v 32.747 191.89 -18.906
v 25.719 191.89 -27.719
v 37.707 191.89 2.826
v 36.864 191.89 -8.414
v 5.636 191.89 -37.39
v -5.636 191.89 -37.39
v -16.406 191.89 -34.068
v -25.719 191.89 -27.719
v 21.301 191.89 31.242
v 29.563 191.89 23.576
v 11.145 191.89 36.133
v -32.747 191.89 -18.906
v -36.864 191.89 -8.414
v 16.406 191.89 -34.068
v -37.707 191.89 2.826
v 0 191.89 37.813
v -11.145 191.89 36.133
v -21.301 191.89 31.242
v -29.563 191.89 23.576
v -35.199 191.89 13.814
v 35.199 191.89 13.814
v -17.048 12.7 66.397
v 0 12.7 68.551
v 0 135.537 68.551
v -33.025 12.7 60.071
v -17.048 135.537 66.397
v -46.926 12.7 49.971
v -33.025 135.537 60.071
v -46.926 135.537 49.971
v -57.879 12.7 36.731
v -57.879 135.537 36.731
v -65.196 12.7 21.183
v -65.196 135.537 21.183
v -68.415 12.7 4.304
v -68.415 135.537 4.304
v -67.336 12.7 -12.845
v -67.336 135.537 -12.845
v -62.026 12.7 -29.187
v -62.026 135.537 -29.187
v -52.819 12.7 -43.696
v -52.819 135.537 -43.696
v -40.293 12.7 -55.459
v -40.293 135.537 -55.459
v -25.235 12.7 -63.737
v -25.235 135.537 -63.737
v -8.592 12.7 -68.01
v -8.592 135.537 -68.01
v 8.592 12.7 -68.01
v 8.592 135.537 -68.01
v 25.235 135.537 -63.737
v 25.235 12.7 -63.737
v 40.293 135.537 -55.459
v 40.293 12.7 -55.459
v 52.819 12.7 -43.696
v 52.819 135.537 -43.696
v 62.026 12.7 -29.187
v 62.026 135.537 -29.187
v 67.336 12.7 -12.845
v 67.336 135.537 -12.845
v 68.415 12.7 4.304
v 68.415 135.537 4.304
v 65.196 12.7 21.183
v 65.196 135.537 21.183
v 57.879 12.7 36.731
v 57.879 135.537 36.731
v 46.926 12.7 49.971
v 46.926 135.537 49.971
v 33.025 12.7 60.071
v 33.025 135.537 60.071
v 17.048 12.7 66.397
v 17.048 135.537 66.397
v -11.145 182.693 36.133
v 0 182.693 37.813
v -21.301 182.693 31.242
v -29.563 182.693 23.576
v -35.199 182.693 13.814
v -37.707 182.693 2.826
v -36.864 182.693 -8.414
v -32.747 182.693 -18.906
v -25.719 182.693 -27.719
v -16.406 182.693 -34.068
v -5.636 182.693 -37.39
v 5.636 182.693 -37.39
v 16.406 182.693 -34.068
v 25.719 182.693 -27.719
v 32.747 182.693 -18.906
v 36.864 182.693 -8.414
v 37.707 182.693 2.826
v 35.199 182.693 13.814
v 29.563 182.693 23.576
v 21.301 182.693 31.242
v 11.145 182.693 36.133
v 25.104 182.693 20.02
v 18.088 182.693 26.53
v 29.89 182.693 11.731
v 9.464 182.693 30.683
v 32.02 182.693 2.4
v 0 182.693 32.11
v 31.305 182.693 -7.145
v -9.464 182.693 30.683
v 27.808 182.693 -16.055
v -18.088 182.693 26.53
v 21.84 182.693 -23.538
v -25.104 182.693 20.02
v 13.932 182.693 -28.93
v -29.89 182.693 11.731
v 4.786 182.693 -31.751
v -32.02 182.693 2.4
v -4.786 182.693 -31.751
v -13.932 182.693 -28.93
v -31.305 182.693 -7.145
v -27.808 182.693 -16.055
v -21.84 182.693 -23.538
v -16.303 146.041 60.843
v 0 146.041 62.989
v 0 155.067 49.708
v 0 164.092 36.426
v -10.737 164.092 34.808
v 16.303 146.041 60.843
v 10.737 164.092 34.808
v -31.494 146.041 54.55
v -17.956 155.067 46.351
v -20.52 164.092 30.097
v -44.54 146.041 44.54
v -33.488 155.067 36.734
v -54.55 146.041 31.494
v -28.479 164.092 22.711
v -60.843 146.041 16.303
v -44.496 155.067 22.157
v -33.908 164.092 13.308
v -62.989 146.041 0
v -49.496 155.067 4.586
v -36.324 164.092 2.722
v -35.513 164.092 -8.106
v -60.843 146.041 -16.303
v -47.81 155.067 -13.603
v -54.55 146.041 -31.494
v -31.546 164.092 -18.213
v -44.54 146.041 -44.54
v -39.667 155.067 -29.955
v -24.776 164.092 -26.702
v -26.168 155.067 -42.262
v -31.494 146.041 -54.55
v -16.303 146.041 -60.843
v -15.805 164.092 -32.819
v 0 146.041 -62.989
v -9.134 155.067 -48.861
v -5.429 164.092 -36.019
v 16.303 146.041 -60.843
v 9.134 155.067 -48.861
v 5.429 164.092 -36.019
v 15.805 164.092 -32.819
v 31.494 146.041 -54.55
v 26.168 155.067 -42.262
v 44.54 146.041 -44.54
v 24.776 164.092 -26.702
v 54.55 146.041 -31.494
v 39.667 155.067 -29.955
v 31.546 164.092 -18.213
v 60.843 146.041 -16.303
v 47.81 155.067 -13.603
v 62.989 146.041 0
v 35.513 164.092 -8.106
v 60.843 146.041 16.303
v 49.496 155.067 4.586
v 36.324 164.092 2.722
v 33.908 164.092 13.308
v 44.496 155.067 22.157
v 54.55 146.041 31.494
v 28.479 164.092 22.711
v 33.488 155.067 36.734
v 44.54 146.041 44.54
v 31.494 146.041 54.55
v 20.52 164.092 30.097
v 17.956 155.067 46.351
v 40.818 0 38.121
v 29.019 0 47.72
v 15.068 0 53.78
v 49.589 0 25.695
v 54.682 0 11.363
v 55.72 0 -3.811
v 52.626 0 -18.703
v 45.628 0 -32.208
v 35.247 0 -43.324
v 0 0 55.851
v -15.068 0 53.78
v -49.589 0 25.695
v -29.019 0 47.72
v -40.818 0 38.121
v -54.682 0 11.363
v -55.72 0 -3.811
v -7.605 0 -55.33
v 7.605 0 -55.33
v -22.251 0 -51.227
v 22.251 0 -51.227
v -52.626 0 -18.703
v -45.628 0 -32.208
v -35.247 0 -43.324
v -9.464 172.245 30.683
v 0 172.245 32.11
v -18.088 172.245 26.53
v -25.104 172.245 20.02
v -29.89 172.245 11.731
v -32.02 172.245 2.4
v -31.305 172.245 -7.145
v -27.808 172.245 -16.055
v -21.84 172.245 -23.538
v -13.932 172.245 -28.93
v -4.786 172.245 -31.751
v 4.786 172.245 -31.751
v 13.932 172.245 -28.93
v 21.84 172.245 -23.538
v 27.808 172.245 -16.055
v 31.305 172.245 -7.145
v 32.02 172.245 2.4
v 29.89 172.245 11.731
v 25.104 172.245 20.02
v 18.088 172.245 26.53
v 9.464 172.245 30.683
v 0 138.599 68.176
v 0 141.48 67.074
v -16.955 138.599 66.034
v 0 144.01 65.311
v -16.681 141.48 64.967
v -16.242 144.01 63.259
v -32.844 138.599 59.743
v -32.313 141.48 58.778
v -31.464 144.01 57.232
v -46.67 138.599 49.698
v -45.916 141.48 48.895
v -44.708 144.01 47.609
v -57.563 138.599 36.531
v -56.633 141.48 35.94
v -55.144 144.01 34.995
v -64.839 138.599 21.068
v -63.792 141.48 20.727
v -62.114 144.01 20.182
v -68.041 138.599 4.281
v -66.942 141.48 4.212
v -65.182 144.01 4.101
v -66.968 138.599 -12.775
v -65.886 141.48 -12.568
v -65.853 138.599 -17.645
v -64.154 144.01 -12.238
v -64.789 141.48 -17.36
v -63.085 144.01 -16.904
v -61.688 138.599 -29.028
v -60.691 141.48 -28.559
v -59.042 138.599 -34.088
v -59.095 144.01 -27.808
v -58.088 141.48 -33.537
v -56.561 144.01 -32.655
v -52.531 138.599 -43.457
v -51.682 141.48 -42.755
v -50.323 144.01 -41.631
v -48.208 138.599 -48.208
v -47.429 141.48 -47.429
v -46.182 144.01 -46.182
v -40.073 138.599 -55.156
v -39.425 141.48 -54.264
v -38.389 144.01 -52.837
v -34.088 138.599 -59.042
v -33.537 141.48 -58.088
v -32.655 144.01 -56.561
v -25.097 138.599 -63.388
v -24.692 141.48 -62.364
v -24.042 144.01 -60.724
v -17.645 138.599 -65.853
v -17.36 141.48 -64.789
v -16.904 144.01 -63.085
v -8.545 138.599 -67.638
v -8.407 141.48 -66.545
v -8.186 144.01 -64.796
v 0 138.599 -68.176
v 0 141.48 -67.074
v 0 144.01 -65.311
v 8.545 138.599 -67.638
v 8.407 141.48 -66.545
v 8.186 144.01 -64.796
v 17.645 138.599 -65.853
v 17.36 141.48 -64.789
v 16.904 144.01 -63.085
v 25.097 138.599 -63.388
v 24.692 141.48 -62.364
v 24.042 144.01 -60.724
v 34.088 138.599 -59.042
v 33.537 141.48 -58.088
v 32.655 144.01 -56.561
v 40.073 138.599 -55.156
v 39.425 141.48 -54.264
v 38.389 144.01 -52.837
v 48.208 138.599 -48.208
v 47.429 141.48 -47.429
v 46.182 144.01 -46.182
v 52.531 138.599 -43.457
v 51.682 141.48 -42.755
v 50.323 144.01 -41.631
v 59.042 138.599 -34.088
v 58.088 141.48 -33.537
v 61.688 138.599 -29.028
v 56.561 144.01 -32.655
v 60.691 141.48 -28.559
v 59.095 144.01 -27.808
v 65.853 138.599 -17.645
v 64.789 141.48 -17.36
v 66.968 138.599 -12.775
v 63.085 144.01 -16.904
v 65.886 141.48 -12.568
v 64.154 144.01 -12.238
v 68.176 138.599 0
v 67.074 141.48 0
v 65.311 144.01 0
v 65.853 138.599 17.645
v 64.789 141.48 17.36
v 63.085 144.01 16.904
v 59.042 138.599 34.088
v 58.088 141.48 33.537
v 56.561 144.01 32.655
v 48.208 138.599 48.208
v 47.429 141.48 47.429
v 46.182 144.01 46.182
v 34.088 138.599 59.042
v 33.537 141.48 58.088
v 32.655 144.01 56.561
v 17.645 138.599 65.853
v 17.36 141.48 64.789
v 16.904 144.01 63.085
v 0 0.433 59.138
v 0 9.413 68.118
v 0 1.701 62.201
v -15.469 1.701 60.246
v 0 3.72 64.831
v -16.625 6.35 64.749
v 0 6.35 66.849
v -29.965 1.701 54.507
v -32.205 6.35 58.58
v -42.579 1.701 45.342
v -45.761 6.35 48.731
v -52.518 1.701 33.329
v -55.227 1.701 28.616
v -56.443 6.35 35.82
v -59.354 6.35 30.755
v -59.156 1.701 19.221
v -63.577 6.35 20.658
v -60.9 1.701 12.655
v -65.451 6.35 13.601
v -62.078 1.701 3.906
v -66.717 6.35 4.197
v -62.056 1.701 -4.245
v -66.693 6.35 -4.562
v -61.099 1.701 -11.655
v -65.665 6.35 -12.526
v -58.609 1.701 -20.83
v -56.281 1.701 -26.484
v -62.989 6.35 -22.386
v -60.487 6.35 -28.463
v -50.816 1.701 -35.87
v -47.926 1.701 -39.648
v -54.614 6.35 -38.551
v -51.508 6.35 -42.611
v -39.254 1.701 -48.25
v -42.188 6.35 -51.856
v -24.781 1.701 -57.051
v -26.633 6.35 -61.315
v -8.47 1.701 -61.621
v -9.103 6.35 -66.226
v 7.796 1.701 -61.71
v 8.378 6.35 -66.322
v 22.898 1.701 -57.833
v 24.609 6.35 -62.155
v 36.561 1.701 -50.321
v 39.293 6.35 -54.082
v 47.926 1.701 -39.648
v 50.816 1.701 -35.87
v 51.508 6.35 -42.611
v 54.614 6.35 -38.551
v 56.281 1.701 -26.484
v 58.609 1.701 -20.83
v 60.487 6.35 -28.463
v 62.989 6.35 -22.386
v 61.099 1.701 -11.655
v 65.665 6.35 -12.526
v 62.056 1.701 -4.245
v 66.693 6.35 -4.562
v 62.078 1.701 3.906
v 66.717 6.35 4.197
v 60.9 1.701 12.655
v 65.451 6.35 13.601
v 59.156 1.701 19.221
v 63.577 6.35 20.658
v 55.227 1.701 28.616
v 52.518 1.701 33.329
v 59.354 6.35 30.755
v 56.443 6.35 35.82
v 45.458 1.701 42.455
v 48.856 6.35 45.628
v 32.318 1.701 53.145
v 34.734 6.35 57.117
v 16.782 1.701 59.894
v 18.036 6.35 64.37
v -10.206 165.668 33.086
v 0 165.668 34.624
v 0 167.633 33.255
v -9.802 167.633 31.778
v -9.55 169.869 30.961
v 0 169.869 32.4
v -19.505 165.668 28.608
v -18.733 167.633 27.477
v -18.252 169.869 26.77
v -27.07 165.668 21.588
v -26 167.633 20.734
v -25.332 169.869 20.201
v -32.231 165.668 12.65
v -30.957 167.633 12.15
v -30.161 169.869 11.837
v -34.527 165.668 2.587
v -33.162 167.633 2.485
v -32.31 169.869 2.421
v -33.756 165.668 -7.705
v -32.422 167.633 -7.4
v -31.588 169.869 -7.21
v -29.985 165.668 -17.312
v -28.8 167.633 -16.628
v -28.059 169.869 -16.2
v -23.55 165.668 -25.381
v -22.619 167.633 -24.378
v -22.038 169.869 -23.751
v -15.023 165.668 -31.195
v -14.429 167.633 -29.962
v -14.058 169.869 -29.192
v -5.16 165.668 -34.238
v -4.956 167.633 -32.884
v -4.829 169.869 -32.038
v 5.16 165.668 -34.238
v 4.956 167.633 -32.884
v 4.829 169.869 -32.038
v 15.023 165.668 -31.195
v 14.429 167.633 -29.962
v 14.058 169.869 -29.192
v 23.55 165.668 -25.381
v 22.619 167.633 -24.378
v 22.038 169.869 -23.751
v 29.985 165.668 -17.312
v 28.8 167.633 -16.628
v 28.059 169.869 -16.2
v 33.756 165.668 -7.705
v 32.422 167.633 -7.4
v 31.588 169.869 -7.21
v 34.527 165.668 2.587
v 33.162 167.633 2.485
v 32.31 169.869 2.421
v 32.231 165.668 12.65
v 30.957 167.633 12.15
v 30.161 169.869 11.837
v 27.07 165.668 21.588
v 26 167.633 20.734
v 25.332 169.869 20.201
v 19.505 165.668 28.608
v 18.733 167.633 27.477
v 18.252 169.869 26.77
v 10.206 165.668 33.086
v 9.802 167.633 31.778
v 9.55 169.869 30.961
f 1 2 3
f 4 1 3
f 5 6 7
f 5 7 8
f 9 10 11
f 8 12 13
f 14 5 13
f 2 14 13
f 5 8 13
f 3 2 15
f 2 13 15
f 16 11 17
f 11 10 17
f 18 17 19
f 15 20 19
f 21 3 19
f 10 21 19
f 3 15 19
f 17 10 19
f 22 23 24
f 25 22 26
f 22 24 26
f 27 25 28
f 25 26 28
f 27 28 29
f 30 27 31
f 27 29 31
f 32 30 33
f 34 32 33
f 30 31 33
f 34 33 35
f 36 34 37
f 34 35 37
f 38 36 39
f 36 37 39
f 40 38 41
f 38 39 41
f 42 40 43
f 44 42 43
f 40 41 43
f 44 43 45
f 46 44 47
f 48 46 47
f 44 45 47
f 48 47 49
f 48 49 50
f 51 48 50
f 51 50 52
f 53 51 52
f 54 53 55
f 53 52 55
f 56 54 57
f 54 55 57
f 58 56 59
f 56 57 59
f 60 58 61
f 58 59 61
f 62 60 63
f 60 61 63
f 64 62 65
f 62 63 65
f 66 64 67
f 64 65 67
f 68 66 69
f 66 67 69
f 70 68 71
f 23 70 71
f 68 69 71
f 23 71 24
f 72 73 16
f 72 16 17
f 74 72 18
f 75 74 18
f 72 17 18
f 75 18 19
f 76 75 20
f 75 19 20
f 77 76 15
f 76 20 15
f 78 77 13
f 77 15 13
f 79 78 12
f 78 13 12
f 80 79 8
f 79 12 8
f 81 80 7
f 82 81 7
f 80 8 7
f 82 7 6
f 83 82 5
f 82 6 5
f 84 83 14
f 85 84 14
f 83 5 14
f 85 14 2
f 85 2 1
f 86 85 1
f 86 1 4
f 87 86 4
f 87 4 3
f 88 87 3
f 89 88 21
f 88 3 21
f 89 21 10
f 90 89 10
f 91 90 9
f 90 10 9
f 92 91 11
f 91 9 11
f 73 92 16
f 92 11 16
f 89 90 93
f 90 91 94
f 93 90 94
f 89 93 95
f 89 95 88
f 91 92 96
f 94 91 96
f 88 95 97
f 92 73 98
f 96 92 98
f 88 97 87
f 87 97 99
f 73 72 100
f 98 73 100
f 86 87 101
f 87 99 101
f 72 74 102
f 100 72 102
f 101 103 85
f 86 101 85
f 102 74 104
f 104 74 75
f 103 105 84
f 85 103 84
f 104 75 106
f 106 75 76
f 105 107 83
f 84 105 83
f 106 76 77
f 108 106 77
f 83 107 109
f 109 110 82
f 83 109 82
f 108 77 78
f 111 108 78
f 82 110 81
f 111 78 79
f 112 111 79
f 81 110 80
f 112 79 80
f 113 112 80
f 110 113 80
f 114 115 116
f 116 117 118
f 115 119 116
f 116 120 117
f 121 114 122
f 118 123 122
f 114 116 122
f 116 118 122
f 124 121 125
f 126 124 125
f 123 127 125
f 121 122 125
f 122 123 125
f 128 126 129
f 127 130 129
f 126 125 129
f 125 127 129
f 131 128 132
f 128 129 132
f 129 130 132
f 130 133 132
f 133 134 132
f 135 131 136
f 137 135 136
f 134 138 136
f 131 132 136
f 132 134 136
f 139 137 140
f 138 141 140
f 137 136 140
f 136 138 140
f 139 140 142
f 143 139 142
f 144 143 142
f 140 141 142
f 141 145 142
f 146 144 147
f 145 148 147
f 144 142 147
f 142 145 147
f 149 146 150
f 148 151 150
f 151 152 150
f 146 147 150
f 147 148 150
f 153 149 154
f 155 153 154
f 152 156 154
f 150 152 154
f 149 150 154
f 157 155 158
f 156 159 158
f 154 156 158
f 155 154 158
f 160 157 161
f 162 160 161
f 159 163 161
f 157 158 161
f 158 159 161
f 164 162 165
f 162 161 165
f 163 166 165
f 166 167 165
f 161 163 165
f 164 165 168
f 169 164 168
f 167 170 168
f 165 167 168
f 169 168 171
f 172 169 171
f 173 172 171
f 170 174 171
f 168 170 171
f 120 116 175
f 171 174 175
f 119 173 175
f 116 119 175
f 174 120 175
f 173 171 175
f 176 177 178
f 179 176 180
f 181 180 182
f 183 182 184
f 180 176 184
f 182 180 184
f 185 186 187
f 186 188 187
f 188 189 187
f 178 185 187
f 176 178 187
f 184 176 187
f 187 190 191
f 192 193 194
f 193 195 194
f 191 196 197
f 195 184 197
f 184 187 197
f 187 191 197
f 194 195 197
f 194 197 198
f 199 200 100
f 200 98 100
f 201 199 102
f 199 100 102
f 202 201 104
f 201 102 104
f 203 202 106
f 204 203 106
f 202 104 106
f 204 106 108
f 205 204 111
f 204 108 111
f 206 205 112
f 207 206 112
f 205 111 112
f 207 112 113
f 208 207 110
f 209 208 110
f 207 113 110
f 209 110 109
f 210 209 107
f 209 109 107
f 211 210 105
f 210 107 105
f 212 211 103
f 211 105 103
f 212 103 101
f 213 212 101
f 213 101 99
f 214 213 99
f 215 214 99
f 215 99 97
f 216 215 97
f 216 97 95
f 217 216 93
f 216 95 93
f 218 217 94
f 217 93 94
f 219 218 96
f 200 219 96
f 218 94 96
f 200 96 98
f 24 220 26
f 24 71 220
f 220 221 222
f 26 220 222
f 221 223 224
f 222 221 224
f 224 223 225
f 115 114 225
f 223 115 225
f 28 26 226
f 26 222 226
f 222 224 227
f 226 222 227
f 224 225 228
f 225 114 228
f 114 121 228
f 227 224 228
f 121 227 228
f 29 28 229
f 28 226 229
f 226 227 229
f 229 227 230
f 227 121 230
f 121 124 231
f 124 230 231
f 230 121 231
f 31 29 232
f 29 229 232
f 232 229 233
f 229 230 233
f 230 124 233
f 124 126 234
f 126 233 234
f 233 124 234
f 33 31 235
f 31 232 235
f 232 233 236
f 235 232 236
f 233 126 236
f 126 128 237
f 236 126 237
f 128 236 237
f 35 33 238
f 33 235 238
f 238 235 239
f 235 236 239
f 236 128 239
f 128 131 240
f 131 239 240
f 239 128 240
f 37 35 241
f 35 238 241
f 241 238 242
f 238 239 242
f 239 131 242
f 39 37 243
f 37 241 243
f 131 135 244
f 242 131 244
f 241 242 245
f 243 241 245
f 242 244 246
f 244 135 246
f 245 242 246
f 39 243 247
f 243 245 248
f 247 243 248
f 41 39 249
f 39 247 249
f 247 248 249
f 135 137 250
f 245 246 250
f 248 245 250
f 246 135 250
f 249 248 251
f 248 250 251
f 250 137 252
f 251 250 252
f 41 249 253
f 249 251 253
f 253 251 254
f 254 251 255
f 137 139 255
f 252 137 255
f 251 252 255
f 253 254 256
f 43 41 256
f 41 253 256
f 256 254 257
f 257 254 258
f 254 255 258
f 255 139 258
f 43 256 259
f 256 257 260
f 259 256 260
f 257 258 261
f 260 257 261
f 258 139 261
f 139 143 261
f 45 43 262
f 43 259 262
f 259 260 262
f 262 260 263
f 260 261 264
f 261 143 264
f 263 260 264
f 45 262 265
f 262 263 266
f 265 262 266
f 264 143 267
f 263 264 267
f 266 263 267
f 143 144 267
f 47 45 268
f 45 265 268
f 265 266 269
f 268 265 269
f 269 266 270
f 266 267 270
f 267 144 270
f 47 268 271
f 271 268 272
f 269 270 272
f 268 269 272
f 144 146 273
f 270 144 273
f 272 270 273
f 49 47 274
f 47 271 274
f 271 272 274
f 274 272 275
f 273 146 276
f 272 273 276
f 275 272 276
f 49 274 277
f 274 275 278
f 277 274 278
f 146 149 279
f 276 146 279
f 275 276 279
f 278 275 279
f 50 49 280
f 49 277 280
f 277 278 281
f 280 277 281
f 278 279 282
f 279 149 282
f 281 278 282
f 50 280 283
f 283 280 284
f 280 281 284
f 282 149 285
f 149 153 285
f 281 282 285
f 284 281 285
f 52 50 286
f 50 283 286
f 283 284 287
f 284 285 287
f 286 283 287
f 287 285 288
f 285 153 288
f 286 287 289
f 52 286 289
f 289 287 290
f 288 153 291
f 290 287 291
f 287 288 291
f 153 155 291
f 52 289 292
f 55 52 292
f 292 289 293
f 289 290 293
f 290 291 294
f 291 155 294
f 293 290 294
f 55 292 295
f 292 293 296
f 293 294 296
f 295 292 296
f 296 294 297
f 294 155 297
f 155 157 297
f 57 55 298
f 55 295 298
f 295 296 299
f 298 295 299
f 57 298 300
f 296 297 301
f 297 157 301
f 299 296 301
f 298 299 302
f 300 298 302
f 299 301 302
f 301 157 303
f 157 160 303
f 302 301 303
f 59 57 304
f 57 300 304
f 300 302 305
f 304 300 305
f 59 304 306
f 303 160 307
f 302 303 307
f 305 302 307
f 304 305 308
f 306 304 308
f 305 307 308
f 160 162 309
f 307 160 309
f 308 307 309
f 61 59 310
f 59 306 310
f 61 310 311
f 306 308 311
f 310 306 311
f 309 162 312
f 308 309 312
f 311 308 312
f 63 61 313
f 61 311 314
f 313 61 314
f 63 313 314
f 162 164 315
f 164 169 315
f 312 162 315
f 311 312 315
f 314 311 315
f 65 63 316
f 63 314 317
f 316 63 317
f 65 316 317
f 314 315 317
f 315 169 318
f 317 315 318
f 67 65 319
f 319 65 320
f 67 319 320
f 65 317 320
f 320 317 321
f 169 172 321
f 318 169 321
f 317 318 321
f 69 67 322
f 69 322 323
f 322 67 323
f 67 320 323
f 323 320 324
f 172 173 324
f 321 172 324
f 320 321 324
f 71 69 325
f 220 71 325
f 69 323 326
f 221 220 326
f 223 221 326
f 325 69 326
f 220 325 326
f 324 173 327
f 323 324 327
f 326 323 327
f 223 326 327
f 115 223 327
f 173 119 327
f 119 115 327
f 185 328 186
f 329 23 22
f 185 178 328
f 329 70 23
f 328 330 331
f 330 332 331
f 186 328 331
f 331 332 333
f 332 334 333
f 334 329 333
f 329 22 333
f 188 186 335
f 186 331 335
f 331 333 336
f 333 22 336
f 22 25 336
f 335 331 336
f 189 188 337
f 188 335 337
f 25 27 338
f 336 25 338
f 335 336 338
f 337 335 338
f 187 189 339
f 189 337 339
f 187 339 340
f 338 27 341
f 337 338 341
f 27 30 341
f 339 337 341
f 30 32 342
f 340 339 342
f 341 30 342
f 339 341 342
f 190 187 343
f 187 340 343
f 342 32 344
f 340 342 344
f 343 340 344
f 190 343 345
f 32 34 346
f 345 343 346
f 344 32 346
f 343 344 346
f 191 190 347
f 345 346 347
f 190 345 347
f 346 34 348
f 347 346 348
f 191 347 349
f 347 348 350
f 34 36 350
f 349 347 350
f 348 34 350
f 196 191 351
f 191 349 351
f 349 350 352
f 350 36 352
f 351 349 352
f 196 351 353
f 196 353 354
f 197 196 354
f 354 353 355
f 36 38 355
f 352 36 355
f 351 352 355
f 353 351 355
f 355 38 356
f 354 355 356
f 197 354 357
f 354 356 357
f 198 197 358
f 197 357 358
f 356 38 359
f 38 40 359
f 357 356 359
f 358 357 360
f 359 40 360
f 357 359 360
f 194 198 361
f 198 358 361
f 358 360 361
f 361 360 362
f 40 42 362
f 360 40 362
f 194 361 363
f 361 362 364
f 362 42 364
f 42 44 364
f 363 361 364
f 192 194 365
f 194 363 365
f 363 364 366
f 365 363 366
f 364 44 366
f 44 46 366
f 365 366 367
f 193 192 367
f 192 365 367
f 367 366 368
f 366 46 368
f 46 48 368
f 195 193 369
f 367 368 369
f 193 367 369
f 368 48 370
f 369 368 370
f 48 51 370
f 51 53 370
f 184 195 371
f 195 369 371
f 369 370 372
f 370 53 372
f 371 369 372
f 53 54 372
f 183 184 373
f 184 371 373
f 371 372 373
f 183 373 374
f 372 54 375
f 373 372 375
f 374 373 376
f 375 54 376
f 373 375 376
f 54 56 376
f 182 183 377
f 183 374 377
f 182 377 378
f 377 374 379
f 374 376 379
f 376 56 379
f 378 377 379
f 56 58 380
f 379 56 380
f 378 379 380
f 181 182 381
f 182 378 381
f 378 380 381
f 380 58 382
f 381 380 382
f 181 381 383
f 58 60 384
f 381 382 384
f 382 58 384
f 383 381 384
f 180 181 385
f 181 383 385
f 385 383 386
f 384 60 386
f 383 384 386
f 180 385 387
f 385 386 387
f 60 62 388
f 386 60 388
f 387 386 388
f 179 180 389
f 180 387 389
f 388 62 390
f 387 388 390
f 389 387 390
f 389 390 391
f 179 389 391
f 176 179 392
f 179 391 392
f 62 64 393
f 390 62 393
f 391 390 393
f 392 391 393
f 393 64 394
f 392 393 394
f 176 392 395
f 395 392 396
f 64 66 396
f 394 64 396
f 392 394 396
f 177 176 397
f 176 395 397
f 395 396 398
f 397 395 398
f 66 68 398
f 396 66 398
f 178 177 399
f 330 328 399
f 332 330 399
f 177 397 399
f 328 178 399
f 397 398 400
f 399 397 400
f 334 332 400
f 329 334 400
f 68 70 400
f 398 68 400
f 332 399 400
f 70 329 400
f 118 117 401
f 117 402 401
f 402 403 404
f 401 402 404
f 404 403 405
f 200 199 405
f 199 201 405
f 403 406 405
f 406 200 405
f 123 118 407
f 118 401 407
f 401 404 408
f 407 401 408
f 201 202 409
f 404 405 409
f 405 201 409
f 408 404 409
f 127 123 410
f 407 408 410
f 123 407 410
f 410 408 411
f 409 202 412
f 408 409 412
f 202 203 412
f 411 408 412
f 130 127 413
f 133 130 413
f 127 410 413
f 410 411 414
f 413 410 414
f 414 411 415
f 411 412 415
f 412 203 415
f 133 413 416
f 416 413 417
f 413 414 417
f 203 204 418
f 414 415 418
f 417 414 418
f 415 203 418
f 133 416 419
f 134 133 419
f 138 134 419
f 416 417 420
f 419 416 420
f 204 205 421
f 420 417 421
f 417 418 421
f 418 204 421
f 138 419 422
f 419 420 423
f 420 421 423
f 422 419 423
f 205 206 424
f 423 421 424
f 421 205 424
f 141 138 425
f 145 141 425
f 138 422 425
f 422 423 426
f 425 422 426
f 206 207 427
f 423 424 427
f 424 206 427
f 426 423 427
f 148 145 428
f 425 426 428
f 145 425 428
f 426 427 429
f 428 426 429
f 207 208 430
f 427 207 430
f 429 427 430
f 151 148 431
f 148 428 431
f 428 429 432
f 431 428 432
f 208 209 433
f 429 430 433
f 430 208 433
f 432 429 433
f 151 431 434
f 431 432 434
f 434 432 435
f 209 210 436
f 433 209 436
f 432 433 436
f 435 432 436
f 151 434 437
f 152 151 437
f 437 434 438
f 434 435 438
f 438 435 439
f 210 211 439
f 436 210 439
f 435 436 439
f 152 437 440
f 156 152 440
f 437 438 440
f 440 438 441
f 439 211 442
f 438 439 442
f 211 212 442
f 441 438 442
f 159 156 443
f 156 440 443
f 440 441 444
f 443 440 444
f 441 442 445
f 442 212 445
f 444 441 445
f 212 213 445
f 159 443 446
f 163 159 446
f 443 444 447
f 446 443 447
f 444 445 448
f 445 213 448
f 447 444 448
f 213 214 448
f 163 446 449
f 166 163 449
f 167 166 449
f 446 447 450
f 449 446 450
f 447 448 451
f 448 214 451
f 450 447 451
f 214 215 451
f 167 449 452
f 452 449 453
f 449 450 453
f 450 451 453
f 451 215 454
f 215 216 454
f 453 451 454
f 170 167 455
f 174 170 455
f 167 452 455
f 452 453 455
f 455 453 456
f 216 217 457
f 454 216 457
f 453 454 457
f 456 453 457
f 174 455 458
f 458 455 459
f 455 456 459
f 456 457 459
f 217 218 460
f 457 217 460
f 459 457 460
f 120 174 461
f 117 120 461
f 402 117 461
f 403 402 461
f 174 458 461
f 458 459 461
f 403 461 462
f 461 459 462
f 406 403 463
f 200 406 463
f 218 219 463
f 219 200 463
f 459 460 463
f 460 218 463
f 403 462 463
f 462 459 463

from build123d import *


with BuildPart() as part:
    # Sketch1 → Revolve1 (revolve)
    with BuildSketch(Plane.XY, mode=Mode.PRIVATE) as revolve1_sk:
        with BuildLine():
            Line((0, 0), (55.850610629, 0))
            ThreePointArc((55.850610629, 0), (64.83086675, 3.719743879), (68.550610629, 12.7))
            Line((68.550610629, 12.7), (68.550610629, 135.537090781))
            ThreePointArc((68.550610629, 135.537090781), (67.07437947, 141.479902659), (62.988876295, 146.041145392))
            Line((62.988876295, 146.041145392), (36.426242146, 164.092378593))
            ThreePointArc((36.426242146, 164.092378593), (33.255344861, 167.632513451), (32.109591896, 172.244930881))
            Line((32.109591896, 172.244930881), (32.109591896, 182.693006016))
            Line((32.109591896, 182.693006016), (37.812538782, 182.693006016))
            Line((37.812538782, 182.693006016), (37.812538782, 191.889991998))
            Line((37.812538782, 191.889991998), (0, 191.889991998))
            Line((0, 191.889991998), (0, 0))
        make_face()
    revolve(revolve1_sk.sketch.rotate(Axis((0, 191.889991998, 0), (0, -1, 0)), 90), axis=Axis((0, 191.889991998, 0), (0, -1, 0)))


solid = part.part
